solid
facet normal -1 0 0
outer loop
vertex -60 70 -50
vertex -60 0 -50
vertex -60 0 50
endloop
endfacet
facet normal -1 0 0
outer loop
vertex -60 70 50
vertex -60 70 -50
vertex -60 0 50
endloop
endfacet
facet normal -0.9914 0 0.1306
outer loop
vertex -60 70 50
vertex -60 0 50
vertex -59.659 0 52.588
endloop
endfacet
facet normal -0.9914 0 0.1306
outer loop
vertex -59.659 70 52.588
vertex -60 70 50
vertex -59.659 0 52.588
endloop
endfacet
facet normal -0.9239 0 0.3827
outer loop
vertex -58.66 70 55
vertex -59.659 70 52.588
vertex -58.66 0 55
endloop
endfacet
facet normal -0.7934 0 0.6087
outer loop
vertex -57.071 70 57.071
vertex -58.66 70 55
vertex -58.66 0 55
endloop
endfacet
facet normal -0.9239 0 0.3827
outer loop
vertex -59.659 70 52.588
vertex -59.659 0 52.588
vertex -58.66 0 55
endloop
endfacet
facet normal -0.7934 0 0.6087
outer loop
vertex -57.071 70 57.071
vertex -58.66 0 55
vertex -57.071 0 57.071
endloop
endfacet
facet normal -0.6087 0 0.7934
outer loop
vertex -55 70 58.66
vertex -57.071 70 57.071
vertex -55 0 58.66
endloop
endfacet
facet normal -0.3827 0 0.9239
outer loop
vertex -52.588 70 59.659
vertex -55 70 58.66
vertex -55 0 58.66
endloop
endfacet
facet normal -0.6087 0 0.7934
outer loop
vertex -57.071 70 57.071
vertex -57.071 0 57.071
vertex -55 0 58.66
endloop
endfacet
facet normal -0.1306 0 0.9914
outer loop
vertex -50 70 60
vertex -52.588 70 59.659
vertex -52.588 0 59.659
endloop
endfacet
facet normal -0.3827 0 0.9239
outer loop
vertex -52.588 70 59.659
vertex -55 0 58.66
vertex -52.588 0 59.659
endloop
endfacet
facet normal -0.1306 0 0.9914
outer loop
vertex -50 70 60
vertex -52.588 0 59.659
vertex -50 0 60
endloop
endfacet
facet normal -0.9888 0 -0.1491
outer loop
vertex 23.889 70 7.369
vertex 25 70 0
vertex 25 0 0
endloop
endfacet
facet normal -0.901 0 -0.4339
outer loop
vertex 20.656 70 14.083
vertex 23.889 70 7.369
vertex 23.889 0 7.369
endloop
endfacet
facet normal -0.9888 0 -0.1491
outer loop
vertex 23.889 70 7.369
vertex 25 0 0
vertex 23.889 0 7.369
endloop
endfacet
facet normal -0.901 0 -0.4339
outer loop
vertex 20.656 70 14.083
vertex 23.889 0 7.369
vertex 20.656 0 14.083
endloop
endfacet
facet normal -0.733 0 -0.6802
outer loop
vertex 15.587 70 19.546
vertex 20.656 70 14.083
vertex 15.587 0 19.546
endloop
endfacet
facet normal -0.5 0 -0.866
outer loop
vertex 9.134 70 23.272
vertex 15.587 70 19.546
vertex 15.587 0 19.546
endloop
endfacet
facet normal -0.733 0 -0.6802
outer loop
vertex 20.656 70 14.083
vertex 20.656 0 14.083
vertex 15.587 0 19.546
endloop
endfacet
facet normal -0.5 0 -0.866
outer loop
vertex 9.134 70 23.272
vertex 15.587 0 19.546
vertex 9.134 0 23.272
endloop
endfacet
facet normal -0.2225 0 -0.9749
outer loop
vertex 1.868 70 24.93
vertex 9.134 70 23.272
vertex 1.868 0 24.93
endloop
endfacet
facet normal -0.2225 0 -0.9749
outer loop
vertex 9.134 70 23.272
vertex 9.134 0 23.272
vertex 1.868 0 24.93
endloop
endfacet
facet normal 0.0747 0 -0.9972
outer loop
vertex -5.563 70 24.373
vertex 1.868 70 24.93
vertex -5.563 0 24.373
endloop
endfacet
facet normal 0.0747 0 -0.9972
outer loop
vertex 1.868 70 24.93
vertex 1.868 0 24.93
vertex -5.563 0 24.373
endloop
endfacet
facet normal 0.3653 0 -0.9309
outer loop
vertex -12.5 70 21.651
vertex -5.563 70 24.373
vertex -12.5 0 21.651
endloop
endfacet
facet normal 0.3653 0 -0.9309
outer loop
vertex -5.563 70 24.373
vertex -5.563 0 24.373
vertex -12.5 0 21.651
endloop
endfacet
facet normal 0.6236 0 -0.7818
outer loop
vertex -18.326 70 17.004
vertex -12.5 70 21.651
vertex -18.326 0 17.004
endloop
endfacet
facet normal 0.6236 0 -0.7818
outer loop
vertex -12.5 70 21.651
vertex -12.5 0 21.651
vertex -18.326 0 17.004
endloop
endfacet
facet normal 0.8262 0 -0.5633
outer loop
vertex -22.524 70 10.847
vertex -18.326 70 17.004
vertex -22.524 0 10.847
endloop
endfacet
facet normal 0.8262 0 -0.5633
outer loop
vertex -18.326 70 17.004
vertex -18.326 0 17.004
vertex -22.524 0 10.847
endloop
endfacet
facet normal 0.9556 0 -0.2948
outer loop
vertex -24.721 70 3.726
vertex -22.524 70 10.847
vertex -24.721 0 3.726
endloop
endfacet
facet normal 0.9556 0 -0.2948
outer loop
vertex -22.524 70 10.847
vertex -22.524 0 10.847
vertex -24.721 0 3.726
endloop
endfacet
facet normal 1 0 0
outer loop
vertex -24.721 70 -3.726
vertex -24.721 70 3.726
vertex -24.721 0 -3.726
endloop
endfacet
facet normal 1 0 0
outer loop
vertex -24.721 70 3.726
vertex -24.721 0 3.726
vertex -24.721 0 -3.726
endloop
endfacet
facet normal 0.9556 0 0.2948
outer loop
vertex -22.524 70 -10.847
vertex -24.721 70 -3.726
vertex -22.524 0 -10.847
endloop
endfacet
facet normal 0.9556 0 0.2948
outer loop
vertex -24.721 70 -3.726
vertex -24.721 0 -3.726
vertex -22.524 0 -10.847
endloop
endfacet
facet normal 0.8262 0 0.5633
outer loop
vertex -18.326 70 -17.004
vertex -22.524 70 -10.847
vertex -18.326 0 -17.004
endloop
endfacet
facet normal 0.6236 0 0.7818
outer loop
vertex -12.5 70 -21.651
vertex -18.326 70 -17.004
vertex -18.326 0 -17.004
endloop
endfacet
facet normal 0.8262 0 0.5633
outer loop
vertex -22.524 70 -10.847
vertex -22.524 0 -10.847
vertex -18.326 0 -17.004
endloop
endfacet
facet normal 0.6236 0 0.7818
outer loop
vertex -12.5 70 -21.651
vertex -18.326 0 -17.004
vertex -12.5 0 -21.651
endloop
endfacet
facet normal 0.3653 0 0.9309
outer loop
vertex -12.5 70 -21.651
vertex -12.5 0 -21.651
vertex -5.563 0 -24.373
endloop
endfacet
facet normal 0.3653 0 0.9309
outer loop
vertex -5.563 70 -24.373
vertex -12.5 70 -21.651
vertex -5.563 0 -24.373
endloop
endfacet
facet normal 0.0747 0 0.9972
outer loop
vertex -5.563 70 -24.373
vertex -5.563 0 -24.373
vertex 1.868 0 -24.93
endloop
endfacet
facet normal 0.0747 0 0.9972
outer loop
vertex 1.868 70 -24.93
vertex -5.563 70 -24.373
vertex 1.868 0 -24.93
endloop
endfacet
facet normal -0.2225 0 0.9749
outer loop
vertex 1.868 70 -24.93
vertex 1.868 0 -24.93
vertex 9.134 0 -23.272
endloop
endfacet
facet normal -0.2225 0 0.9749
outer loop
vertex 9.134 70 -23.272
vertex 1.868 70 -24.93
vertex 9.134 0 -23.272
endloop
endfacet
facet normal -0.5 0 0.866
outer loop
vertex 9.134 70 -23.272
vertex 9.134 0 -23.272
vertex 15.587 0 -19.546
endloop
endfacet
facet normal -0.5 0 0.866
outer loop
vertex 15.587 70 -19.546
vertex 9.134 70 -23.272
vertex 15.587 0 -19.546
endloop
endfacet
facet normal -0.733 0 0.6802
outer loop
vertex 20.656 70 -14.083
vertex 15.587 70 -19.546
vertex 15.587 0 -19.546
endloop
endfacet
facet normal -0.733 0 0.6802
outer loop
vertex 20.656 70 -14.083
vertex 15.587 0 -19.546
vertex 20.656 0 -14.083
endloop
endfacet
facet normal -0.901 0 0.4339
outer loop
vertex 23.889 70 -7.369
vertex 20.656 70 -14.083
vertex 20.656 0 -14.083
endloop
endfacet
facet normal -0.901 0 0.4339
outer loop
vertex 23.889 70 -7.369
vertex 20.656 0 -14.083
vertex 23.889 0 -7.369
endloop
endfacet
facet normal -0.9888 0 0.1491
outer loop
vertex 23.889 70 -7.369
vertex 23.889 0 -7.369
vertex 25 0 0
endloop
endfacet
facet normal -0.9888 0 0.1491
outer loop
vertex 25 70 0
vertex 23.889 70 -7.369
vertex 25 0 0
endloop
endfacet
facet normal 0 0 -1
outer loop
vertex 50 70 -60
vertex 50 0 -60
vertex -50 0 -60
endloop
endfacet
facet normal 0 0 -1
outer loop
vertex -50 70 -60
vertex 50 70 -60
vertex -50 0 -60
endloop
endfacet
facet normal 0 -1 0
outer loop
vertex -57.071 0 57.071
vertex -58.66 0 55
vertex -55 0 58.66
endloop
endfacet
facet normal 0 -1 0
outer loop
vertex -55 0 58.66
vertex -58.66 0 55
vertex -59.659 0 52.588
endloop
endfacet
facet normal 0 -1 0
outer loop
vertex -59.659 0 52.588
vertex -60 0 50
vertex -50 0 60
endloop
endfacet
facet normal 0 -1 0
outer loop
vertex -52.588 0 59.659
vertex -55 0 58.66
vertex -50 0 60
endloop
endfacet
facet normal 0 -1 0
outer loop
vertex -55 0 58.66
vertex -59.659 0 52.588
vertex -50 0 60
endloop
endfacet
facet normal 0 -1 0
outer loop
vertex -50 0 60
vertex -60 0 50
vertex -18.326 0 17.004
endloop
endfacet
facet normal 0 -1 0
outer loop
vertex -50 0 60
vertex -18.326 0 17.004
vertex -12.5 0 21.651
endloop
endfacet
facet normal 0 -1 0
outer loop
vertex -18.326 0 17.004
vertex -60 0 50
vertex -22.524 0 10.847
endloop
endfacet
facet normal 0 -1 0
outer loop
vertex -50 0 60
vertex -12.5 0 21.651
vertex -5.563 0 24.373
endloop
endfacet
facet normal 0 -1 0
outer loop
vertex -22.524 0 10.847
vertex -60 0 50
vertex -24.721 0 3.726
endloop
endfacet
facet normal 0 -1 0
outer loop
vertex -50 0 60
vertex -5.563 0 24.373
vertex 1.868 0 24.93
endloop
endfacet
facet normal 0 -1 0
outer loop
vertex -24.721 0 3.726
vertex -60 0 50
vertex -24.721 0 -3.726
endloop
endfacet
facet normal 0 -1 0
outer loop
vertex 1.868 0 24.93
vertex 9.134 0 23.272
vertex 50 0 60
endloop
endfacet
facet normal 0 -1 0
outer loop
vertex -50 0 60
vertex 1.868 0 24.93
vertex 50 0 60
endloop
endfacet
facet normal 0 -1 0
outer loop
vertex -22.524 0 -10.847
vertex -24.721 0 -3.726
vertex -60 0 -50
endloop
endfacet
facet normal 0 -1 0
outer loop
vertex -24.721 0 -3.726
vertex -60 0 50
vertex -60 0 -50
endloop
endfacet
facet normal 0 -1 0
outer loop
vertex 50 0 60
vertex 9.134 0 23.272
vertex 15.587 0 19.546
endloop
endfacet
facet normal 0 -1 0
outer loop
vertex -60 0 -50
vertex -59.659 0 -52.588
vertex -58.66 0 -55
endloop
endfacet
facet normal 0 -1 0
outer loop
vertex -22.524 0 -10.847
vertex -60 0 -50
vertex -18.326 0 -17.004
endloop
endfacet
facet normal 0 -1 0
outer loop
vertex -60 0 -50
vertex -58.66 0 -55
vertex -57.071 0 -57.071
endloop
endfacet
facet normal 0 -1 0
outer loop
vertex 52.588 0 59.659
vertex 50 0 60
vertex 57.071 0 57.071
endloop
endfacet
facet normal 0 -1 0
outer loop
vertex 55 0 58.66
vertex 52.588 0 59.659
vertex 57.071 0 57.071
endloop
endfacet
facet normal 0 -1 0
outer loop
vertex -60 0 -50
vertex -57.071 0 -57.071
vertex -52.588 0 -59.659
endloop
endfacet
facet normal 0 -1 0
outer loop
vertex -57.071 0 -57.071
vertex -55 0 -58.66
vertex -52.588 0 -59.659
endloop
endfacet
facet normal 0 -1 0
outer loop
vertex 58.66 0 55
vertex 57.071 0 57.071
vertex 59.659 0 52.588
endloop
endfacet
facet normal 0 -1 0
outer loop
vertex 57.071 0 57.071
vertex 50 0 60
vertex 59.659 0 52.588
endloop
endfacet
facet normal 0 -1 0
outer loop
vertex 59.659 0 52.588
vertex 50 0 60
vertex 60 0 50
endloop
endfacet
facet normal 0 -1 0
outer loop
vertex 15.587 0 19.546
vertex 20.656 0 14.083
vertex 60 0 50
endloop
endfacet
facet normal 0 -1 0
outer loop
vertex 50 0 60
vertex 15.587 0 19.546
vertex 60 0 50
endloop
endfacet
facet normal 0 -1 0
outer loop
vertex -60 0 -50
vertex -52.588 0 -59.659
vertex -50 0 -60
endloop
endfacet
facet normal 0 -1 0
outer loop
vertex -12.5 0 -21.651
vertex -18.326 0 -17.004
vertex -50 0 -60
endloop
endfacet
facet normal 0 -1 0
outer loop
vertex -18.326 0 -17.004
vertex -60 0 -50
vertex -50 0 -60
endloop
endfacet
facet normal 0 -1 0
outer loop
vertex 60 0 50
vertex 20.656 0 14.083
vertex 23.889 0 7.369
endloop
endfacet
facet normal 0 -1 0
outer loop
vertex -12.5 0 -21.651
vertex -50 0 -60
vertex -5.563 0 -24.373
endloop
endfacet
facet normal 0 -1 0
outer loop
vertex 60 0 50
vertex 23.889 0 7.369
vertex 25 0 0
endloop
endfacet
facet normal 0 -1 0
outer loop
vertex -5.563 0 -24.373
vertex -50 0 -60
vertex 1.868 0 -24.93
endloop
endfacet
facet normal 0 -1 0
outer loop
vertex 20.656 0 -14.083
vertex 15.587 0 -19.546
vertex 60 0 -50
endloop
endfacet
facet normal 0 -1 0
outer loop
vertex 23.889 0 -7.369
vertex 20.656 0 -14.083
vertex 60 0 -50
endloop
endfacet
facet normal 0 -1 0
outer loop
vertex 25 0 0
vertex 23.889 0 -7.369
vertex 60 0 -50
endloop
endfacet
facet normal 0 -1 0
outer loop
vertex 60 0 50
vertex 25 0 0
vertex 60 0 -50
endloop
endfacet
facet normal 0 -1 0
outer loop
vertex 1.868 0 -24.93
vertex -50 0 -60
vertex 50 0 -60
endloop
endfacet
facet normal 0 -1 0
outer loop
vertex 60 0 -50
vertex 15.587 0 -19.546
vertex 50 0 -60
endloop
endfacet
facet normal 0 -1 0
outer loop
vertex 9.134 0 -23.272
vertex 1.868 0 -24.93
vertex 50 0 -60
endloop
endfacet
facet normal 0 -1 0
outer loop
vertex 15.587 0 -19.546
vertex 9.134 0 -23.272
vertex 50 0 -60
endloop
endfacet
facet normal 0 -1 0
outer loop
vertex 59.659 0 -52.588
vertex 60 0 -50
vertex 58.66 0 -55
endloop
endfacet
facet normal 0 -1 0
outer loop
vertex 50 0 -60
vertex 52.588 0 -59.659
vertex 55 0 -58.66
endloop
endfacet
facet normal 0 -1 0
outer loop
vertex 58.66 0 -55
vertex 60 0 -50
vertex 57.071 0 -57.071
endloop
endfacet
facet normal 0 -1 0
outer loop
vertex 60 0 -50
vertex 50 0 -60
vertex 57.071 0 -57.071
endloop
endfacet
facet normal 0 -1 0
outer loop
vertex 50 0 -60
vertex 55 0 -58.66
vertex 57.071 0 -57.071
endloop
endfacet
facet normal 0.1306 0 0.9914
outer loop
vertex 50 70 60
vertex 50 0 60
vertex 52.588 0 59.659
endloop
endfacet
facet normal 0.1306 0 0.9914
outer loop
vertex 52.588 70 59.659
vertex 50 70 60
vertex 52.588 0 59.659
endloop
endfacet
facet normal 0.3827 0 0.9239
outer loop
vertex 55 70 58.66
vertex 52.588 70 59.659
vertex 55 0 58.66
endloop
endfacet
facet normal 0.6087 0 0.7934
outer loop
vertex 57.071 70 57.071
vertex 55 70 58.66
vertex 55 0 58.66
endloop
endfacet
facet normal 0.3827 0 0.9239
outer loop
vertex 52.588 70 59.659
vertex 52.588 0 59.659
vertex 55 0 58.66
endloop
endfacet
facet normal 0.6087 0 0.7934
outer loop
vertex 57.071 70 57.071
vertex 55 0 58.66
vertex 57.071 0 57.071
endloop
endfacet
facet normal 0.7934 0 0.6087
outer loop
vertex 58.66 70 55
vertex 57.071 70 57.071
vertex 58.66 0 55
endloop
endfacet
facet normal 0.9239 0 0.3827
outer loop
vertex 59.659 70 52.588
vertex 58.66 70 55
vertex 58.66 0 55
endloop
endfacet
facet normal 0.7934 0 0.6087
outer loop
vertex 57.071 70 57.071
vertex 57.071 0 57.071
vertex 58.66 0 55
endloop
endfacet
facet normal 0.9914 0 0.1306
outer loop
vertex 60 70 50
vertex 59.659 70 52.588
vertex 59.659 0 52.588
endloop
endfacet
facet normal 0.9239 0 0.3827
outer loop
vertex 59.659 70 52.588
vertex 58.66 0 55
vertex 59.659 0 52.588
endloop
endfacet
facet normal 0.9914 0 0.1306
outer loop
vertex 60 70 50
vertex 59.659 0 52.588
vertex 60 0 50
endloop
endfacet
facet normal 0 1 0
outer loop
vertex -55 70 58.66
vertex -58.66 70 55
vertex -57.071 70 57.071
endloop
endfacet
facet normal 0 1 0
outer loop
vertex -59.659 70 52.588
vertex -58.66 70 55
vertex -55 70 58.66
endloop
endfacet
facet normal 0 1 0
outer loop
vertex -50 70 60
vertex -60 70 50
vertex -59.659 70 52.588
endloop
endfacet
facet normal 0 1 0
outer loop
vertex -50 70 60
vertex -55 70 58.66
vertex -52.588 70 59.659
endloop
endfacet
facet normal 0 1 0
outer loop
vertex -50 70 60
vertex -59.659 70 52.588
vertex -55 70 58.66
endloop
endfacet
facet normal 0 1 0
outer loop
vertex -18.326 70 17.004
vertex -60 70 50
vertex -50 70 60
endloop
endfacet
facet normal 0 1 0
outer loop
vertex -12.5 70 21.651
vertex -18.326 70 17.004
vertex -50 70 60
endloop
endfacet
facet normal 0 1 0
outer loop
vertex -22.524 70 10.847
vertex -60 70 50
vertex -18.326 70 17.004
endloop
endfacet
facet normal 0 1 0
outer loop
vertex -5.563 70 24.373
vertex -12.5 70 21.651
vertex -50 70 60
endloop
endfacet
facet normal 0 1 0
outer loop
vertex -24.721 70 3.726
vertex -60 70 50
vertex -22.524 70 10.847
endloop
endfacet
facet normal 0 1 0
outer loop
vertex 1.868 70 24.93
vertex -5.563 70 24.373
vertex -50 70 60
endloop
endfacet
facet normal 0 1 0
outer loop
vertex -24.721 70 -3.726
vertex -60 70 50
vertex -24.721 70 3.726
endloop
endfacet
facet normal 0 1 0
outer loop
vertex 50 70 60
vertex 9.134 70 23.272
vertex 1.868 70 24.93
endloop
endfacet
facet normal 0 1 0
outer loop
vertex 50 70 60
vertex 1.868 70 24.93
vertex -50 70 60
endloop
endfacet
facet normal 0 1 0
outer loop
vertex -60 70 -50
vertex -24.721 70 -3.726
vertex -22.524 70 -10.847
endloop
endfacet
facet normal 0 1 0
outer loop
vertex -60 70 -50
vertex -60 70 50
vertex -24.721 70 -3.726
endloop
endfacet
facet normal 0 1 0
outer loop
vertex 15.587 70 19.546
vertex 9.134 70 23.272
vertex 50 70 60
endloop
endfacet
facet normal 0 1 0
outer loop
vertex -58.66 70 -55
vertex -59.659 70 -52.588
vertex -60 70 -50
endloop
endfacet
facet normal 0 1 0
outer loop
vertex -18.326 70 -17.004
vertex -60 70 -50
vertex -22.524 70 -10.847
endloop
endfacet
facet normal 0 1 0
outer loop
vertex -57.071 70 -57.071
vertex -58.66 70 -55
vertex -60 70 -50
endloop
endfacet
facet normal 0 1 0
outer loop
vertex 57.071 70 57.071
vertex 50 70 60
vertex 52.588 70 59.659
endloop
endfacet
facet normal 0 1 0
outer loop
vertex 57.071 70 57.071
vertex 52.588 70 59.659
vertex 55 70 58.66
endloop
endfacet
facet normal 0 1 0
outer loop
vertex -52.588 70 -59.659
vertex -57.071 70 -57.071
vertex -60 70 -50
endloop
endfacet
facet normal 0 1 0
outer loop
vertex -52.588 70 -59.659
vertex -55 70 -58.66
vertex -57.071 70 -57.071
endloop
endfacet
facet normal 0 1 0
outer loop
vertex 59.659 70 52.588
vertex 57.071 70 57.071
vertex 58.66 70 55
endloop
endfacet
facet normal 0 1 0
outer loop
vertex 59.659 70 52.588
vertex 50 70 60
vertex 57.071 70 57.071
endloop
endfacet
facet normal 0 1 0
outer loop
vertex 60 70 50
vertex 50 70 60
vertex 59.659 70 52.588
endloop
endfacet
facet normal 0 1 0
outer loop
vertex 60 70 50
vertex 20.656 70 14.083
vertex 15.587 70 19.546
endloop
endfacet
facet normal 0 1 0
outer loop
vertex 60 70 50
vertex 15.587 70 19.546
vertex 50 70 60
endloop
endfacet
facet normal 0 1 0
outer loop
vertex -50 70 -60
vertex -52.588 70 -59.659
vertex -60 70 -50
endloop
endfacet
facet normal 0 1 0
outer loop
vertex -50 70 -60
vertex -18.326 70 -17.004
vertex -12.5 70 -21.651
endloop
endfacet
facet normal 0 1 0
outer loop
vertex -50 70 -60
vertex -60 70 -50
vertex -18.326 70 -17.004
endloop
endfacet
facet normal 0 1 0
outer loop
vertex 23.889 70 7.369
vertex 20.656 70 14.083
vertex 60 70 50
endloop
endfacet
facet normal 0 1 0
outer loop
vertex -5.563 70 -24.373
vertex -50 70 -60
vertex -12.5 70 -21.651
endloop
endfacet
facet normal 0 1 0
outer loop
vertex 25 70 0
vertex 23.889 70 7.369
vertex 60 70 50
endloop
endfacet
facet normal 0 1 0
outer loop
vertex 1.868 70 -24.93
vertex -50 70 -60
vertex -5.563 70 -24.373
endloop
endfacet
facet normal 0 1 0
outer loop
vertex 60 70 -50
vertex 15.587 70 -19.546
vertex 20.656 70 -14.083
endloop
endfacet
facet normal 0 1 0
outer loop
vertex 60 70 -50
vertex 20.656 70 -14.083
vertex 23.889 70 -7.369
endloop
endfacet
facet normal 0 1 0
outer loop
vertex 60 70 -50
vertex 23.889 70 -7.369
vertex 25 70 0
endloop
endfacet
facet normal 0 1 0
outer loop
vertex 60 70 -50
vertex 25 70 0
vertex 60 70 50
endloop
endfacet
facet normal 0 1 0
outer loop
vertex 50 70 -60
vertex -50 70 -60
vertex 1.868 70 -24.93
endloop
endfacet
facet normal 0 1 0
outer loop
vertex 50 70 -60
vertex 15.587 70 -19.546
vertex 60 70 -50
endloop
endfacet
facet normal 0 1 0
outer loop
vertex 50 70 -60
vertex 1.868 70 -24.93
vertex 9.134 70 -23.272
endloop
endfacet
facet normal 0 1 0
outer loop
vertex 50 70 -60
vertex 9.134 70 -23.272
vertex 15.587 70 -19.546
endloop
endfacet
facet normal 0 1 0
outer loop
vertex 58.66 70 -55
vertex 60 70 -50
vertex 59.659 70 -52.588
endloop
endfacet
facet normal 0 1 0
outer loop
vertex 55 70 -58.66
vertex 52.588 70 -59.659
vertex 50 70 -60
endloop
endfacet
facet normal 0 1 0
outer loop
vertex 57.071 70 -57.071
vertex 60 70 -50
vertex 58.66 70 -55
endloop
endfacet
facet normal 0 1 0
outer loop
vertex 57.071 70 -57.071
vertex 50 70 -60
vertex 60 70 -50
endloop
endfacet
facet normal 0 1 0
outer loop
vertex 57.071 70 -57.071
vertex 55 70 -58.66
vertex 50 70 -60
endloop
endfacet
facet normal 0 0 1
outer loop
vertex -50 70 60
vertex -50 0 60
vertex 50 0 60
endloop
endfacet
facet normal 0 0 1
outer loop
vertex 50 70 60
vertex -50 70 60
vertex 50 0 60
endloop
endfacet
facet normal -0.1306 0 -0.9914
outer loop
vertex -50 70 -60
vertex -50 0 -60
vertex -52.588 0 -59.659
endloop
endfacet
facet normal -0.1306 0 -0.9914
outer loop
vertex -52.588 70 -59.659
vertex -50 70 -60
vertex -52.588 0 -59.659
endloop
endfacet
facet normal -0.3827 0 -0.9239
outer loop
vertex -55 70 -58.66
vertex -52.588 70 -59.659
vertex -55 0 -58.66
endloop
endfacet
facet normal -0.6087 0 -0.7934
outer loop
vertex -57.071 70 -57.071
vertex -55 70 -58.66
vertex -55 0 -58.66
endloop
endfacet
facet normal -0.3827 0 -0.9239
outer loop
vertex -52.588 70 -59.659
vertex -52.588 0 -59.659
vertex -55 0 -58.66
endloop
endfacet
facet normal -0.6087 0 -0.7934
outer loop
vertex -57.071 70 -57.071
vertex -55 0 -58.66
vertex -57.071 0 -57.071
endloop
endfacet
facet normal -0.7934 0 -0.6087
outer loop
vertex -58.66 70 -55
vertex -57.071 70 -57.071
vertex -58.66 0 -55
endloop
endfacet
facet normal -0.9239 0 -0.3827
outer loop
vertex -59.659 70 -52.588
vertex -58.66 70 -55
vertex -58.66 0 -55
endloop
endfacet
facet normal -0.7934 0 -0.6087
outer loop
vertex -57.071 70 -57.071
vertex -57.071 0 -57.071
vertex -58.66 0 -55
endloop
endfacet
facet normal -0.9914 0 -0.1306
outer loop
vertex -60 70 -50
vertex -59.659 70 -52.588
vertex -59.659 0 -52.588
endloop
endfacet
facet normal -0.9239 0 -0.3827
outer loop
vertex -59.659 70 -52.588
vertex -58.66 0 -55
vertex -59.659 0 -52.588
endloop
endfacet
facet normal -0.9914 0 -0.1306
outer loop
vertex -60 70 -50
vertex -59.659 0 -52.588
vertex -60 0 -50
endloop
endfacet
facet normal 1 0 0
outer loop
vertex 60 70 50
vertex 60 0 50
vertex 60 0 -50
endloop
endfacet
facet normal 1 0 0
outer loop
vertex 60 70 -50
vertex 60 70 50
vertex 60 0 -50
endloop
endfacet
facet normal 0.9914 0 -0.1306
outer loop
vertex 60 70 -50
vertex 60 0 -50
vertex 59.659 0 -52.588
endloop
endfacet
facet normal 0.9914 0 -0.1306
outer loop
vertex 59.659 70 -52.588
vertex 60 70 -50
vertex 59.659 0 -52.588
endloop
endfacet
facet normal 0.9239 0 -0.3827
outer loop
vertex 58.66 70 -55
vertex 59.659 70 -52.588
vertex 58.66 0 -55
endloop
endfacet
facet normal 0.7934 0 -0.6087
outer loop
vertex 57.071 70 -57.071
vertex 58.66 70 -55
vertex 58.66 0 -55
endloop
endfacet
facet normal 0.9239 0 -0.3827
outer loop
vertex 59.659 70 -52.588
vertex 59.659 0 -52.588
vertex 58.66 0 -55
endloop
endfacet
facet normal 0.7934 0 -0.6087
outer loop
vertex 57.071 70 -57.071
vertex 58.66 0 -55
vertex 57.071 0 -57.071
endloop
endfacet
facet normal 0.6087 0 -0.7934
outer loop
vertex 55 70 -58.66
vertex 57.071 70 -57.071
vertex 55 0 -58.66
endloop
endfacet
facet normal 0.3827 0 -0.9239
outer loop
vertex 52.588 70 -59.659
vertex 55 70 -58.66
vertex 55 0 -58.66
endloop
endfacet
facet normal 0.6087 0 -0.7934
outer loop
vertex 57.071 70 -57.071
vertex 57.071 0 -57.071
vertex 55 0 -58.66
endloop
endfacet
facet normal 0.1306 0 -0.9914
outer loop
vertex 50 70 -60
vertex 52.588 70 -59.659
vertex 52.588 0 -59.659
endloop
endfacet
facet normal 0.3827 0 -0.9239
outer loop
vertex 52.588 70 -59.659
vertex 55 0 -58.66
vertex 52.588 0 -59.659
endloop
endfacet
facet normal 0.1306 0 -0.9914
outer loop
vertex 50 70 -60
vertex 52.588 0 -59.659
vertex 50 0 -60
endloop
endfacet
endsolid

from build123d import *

# Parameters (mm, degrees)
BOSS_EXTRUDE1_DEPTH = 70
SKETCH4_R           = 25
CUT_EXTRUDE4_DEPTH  = 71


with BuildPart() as part:
    # Sketch2 → Boss-Extrude1 (new body)
    with BuildSketch(Plane(origin=(0, 0, 0), x_dir=(1, 0, 0), z_dir=(0, 1, 0))):
        with BuildLine():
            Line((-50, -60), (50, -60))
            ThreePointArc((50, -60), (57.071067812, -57.071067812), (60, -50))
            Line((60, -50), (60, 50))
            ThreePointArc((60, 50), (57.071067812, 57.071067812), (50, 60))
            Line((50, 60), (-50, 60))
            ThreePointArc((-50, 60), (-57.071067812, 57.071067812), (-60, 50))
            Line((-60, 50), (-60, -50))
            ThreePointArc((-60, -50), (-57.071067812, -57.071067812), (-50, -60))
        make_face()
    extrude(amount=BOSS_EXTRUDE1_DEPTH)

    # Sketch4 → Cut-Extrude4 (cut, through all)
    with BuildSketch(Plane.XZ):
        Circle(SKETCH4_R)
    extrude(amount=-CUT_EXTRUDE4_DEPTH, mode=Mode.SUBTRACT)


solid = part.part
